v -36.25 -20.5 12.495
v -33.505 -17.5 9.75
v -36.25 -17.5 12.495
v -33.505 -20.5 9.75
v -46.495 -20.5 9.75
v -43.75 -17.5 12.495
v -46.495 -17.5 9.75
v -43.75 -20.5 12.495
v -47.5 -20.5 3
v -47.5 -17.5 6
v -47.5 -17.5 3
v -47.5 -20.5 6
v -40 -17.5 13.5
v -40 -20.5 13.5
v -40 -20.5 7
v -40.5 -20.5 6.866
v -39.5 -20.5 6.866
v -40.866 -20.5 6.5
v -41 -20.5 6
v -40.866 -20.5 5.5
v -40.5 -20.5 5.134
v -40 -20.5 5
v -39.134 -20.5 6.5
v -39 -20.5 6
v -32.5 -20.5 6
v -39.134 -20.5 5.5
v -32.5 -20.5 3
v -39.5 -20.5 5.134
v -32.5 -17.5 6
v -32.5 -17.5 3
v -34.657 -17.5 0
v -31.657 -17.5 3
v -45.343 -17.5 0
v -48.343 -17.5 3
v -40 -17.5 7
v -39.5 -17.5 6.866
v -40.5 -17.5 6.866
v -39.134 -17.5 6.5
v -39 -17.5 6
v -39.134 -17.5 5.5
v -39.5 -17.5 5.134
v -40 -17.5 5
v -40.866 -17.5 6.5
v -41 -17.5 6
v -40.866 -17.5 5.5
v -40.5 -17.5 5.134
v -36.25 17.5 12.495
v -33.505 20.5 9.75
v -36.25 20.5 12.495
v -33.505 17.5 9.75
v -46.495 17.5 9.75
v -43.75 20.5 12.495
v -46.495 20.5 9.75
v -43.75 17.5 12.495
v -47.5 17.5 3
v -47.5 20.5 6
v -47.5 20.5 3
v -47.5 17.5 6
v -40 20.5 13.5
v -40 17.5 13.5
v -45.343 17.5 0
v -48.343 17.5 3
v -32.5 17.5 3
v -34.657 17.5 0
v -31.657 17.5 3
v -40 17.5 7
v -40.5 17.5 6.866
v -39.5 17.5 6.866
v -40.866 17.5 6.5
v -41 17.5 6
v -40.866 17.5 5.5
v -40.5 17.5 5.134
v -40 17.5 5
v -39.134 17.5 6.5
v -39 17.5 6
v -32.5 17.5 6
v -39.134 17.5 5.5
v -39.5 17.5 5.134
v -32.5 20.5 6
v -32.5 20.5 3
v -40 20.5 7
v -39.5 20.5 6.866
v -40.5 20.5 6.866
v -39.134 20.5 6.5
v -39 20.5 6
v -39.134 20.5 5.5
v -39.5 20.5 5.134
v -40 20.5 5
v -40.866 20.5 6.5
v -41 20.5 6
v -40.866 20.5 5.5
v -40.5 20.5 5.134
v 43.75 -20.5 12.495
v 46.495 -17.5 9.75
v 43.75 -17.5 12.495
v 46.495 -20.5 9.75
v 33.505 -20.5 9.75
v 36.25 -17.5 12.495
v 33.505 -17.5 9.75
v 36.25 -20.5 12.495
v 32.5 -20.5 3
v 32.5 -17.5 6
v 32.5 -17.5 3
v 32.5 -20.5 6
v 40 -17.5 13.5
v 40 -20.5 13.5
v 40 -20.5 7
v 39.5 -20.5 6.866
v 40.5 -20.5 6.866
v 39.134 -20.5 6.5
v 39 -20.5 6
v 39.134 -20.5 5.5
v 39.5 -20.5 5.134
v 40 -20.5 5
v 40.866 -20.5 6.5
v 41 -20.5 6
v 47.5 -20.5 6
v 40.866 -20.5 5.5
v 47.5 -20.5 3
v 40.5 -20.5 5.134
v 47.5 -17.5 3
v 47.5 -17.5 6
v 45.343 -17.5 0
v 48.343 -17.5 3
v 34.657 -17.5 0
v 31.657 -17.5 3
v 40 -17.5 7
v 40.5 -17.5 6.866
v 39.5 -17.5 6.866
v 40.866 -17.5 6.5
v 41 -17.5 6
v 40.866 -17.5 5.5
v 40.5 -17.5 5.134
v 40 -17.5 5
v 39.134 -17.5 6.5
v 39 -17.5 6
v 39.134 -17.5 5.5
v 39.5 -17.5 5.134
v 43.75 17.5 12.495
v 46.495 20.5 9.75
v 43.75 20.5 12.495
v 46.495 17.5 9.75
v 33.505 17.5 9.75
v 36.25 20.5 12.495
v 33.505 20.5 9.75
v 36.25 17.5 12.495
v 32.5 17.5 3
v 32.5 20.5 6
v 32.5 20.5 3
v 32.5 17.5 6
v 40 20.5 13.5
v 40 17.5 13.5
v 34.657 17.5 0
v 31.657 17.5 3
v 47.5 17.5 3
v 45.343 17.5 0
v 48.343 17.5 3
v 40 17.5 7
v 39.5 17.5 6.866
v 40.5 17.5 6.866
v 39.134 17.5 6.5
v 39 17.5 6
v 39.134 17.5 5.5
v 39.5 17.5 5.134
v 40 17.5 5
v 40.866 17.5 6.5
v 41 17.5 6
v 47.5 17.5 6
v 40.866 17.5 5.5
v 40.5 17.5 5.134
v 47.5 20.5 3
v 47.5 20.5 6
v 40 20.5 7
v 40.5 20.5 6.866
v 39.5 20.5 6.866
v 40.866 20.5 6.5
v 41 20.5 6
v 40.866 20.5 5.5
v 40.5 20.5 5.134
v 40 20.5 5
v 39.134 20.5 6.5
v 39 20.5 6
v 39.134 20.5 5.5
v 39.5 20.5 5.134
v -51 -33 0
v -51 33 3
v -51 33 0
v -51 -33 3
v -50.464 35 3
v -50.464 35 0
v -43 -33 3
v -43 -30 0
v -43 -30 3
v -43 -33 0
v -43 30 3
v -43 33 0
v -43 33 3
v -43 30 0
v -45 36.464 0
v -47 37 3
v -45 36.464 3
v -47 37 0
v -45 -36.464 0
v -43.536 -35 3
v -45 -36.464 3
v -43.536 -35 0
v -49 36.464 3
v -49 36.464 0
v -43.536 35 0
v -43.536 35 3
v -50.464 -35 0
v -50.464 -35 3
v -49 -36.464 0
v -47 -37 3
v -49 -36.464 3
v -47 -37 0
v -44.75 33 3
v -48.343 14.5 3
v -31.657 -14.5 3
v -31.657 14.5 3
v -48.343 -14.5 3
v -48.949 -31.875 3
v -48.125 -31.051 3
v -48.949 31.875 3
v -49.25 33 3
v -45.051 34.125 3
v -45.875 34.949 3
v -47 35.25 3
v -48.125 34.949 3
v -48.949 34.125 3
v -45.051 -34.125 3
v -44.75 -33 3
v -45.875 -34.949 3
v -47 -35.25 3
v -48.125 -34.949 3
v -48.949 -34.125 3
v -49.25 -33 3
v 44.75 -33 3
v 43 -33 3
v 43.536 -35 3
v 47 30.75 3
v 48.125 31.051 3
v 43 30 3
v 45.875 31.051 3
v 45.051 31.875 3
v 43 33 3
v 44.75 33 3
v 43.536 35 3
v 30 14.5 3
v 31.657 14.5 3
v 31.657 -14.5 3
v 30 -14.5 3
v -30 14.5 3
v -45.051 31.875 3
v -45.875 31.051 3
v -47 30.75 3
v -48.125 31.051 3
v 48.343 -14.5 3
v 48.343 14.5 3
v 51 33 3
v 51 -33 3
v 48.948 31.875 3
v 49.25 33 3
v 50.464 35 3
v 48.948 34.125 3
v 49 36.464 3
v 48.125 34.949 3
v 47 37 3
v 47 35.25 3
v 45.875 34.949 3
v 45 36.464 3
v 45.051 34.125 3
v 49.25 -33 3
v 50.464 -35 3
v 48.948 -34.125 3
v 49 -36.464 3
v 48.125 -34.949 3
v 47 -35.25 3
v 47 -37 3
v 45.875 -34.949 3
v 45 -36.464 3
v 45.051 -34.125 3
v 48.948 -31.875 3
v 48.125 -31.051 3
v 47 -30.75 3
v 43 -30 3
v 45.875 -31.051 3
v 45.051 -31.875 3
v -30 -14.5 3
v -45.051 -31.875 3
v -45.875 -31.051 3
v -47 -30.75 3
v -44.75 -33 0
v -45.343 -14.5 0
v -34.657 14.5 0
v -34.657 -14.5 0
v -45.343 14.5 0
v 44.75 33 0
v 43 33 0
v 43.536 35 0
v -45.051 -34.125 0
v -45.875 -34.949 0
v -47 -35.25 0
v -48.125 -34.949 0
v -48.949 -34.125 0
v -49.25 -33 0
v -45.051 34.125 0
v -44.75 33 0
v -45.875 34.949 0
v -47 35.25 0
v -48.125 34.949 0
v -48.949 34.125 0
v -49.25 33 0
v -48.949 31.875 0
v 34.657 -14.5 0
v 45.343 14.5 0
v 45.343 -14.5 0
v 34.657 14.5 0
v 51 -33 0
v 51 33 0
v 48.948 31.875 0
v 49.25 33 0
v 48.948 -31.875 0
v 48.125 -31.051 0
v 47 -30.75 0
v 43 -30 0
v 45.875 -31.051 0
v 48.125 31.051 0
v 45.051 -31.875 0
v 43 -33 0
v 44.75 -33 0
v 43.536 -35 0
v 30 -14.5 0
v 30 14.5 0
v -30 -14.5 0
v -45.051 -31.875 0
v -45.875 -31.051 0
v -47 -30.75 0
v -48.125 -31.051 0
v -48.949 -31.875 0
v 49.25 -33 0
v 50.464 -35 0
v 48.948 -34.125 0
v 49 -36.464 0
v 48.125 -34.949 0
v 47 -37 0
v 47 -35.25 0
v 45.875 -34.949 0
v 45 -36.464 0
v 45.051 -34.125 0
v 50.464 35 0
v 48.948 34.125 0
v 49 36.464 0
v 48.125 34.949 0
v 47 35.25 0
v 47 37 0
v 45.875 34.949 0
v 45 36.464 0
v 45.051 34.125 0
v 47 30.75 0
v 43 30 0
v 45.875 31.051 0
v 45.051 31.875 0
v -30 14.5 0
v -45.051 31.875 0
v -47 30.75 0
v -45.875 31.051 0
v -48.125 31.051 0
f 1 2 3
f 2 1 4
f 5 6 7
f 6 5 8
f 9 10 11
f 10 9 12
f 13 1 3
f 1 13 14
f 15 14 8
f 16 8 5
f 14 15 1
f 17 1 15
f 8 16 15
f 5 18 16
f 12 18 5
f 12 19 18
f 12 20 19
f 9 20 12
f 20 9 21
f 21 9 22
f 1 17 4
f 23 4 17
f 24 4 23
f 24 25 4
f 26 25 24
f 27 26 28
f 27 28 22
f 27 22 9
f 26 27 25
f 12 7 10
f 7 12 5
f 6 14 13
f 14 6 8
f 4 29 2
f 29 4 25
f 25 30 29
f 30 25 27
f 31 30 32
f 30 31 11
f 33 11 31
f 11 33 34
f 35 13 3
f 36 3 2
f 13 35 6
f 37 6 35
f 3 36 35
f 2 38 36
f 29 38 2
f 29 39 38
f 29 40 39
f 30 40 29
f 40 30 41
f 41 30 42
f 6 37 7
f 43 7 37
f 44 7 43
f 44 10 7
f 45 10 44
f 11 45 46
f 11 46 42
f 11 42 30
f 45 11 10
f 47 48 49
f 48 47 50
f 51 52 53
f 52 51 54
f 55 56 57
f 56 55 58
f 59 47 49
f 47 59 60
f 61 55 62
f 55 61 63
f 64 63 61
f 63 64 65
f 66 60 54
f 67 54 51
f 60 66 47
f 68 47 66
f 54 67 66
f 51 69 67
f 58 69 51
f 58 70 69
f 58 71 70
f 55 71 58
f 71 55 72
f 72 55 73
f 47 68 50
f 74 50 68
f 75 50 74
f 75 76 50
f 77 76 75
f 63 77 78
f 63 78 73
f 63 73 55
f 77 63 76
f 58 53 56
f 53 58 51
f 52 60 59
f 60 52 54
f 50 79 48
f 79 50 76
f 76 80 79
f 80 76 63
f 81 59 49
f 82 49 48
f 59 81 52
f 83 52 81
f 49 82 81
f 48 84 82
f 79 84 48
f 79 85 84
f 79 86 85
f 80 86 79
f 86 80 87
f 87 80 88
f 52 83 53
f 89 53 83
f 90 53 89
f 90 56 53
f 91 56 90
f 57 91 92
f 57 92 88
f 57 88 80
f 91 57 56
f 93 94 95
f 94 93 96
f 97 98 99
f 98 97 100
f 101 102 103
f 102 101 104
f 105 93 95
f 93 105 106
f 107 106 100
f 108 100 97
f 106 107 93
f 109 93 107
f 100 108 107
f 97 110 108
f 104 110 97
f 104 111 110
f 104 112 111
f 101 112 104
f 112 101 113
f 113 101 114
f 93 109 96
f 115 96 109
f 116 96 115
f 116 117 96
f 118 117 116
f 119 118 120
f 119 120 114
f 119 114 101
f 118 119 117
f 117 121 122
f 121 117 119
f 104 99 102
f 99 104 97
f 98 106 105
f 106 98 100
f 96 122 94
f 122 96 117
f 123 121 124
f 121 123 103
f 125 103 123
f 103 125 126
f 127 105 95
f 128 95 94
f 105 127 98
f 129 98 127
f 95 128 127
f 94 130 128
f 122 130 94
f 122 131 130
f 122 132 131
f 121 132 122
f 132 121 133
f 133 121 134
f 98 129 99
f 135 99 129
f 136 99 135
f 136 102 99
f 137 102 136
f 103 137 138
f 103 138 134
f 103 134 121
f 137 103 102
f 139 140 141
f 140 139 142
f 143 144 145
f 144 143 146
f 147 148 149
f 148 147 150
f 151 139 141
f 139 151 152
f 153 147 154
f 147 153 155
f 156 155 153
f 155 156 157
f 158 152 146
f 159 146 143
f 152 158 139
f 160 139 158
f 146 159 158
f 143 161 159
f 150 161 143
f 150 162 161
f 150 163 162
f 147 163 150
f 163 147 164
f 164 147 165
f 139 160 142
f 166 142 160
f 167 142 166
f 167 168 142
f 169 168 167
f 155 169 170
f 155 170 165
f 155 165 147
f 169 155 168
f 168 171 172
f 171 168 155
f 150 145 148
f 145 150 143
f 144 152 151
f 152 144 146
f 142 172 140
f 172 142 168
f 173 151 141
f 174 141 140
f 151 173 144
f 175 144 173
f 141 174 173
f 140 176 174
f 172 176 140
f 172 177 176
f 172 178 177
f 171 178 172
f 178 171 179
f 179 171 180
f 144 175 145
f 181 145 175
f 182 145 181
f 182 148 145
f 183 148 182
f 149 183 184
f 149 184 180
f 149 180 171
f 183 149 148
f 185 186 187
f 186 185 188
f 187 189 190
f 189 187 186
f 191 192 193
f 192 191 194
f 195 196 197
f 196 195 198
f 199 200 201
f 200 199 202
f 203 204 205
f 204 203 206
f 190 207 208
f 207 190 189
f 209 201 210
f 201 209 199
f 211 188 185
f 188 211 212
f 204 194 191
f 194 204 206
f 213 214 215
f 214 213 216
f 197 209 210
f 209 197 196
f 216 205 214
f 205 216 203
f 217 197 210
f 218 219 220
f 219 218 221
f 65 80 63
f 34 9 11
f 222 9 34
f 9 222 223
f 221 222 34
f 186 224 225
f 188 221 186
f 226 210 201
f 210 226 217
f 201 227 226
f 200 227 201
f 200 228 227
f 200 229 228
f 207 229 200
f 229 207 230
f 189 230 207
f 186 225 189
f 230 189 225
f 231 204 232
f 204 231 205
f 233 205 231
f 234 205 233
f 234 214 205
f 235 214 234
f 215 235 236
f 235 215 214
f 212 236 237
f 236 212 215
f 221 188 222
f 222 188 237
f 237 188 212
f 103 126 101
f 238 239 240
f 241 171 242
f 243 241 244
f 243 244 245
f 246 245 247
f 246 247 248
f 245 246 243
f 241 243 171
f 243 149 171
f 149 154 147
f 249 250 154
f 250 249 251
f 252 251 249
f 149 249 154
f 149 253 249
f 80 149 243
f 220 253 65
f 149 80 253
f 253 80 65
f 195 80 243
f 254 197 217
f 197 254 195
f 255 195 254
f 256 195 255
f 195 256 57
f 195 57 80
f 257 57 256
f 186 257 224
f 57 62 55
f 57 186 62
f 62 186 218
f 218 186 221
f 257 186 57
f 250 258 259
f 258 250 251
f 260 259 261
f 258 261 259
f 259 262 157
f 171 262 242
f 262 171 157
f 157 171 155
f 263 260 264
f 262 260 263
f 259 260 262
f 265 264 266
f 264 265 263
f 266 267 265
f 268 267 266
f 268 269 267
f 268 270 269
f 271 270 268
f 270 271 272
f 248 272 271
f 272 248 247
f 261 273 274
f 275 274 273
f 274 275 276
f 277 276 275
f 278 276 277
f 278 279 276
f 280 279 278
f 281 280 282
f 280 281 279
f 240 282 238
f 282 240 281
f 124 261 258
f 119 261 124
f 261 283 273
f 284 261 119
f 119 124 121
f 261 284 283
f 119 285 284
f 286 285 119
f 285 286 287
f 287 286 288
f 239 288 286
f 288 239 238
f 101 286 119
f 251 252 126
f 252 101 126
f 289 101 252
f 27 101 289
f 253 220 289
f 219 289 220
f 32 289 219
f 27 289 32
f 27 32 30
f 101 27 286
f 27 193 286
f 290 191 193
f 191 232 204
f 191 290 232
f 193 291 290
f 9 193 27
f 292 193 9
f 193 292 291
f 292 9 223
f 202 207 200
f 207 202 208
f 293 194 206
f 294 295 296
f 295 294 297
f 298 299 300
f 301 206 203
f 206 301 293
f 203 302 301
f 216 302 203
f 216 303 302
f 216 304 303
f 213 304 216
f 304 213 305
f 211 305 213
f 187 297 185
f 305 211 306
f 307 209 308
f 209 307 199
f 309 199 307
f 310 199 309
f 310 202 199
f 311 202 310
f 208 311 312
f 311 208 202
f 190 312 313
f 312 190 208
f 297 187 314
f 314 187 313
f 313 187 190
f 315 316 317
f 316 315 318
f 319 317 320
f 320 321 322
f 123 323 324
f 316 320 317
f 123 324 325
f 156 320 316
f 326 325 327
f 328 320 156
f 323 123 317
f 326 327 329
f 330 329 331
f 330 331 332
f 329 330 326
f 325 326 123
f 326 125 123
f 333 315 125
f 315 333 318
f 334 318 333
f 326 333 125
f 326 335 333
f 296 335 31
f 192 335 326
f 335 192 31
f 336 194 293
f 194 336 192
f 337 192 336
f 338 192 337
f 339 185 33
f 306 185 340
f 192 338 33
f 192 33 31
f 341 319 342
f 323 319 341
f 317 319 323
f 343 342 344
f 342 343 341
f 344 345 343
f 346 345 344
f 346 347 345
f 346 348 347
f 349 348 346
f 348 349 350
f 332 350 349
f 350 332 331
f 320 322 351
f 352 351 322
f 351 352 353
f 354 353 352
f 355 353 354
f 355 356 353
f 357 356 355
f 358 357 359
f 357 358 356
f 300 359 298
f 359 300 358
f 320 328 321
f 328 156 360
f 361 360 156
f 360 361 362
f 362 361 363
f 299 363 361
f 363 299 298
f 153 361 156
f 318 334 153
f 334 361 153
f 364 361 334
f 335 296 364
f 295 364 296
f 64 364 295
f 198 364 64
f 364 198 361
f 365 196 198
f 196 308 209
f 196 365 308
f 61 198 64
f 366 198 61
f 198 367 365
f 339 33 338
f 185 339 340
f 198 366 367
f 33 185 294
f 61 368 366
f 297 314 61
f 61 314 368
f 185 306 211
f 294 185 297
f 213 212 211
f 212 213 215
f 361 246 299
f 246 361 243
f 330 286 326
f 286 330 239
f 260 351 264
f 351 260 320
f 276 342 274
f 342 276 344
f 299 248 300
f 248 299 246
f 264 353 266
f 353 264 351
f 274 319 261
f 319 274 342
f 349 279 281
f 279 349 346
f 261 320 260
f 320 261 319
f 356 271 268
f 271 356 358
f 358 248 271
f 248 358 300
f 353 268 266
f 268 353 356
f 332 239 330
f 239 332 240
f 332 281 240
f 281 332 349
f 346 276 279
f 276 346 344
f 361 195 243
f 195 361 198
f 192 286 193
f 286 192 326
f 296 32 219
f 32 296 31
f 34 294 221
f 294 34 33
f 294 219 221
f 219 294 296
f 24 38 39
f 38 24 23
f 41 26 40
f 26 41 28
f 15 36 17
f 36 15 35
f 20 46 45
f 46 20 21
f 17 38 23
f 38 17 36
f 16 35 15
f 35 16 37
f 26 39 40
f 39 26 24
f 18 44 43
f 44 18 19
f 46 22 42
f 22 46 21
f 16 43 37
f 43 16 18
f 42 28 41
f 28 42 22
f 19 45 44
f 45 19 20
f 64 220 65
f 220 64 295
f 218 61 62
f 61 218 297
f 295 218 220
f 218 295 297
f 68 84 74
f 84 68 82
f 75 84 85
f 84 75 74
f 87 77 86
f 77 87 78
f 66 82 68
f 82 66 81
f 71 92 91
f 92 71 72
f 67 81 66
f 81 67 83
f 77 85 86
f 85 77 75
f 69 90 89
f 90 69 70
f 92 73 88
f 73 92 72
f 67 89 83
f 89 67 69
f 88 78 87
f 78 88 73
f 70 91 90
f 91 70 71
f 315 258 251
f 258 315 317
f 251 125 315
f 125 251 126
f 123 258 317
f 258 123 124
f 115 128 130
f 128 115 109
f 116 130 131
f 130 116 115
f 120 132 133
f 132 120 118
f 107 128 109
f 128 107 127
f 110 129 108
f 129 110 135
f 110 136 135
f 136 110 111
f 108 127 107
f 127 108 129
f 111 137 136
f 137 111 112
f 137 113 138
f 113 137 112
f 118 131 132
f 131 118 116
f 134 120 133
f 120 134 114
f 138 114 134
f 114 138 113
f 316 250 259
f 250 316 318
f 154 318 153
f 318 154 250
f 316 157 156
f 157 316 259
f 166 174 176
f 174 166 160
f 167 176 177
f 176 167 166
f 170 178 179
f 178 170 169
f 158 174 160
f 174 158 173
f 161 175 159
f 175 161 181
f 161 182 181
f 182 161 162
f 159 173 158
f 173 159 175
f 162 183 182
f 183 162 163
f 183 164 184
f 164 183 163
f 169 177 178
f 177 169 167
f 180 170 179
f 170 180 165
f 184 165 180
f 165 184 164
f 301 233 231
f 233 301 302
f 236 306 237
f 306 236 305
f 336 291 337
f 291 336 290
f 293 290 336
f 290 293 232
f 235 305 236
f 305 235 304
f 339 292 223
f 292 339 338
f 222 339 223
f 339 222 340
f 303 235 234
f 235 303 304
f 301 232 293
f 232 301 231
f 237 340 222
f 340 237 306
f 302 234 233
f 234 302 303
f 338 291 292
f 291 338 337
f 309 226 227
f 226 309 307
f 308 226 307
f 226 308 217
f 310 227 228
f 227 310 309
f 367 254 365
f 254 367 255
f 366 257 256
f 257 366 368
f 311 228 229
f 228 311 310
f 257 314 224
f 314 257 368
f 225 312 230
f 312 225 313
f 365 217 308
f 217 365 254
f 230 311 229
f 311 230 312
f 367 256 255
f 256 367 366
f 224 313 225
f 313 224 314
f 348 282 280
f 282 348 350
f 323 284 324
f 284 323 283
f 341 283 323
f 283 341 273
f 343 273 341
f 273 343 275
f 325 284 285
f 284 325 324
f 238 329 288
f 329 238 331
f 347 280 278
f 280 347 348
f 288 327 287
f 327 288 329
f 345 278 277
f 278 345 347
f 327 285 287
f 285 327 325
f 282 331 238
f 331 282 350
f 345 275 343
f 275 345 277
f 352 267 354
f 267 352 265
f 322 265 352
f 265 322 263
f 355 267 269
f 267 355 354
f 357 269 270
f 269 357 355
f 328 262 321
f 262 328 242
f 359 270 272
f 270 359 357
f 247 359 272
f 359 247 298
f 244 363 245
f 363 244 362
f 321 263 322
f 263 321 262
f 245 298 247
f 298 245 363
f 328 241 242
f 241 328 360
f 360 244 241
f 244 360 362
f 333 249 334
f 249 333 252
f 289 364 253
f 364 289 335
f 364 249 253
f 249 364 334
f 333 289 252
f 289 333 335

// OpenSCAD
$fn=100;

if($preview){
    translate([0,0, 0])color("LightSteelBlue")bottom();
    translate([0,0,10+5])panel();
    translate([0,0,10+10])color("LightBlue")top();
    translate([0,0,13+15])color("DarkGoldenrod")mm35_bottom();
    translate([0,0,16+20])color("RosyBrown")mm35_top();
    //translate([0,0,15.9])mm35_film();

}else{
    $fn=12;
    mm35_top();
}

module mm35_film(){
    difference(){
        union(){
            color("Sienna")cube([120,35,0.2],center=true);
        }union(){
        
        }
    }
}

module mm35_bottom(){
    difference(){
        union(){
            //body
            translate([0,0,3/2])cube([100,60,3],center=true);
            //screwholes
            for(i=[0:3:3]){
                hull(){
                    for(j=[-1:2:1]){
                        translate([i*31.3333-50+3,j*33,0])cylinder(d=8,h=3);
                    }
                }
            }
        }union(){
            //slide
            translate([0,0,0.3/2+3-0.2])cube([200,35,0.3],center=true);
            translate([0,0,1/2+3-0.9])cube([200,29,1],center=true);
            translate([0,0,3/2])cube([60,29,3],center=true);
            //advance
            for(i=[-1:2:1],j=[-1:2:1]){
                    translate([i*40,1.5+29/2*j+1.5*j,9])rotate([90,0,0])cylinder(d=15,h=3);
                }
            //screwholes
            for(i=[0:3:3]){
                for(j=[-1:2:1]){
                    translate([i*31.3333-50+3,j*33,0])cylinder(d=4.5,h=10);
                }
            }
        }
    }
}

module mm35_top(){
    difference(){
        union(){
            //body
            translate([0,0,3/2])cube([100,60,3],center=true);
            //advance
            for(i=[-1:2:1],j=[-1:2:1]){
                hull(){
                    translate([i*40,1.5+29/2*j+4.5*j,9-3])rotate([90,0,0])cylinder(d=15,h=3);
                    translate([i*40,29/2*j+4.5*j,1/2])cube([15,3,1],center=true);
                }
            }
            //screwholes
            for(i=[0:3:3]){
                hull(){
                    for(j=[-1:2:1]){
                        translate([i*31.3333-50+3,j*33,0])cylinder(d=8,h=3);
                    }
                }
            }
        }union(){
            //viewprt
            translate([0,0,3/2-0.1])cube([60,29,3.4],center=true);
            //cut
            translate([0,0,-20/2-0.1])cube([200,200,20.2],center=true);
            //advance
            for(i=[-1:2:1],j=[-1:2:1]){
                    translate([i*40,1.5+29/2*j+1.5*j,9])rotate([90,0,0])cylinder(d=21,h=3);
                    translate([i*40,4.5+29/2*j+1.5*j,9-3])rotate([90,0,0])cylinder(d=2,h=9);
                }
            //screwholes
            for(i=[0:3:3]){
                for(j=[-1:2:1]){
                    translate([i*31.3333-50+3,j*33,0])cylinder(d=4.5,h=10);
                }
            }
        }
    }
}

/*********************/

module bottom(){
    difference(){
        union(){
            //body
            translate([0,0,10/2])cube([100,60,10],center=true);
            //screwholes
            for(i=[0:1:3]){
                hull(){
                    for(j=[-1:2:1]){
                        translate([i*31.3333-50+3,j*33,0])cylinder(d=8,h=10);
                    }
                }
            }
        }union(){
            //pcb
            translate([-32,0,6/2-0.1])cube([40,29,6],center=true);
            //magnets
            for(i=[-1:1:1],j=[-1:2:1]){
                translate([i*30,j*23,3/2+0.5])cube([12.5,16,3],center=true);
            }
            //screwholes
            for(i=[0:1:3]){
                for(j=[-1:2:1]){
                    translate([i*31.3333-50+3,j*33,0])cylinder(d=3.2,h=10);
                }
            }
        }
    }
}

module top(){
    difference(){
        union(){
            //body
            translate([0,0,3/2])cube([100,60,3],center=true);
            //screwholes
            for(i=[0:1:3]){
                hull(){
                    for(j=[-1:2:1]){
                        translate([i*31.3333-50+3,j*33,0])cylinder(d=8,h=3);
                    }
                }
            }
        }union(){
            // screen
            translate([0,0,1.4/2])cube([96.5,54.6,1.4],center=true);
            translate([0,0,1.1/2])cube([120,30,1.1],center=true);
            translate([1,0,2/2-1])cube([90,50,6],center=true);
            //screwholes
            for(i=[0:1:3]){
                for(j=[-1:2:1]){
                    translate([i*31.3333-50+3,j*33,0])cylinder(d=4.5,h=10);
                }
            }
        }
    }
}

module panel(){
    difference(){
        union(){
            color("darkslategray")translate([0,0,1.1/2])cube([96.5,54.6,1.1],center=true);
            translate([1,0,1.1/2])cube([90,50,1.1],center=true);
        }union(){
        
        }
    }
}
